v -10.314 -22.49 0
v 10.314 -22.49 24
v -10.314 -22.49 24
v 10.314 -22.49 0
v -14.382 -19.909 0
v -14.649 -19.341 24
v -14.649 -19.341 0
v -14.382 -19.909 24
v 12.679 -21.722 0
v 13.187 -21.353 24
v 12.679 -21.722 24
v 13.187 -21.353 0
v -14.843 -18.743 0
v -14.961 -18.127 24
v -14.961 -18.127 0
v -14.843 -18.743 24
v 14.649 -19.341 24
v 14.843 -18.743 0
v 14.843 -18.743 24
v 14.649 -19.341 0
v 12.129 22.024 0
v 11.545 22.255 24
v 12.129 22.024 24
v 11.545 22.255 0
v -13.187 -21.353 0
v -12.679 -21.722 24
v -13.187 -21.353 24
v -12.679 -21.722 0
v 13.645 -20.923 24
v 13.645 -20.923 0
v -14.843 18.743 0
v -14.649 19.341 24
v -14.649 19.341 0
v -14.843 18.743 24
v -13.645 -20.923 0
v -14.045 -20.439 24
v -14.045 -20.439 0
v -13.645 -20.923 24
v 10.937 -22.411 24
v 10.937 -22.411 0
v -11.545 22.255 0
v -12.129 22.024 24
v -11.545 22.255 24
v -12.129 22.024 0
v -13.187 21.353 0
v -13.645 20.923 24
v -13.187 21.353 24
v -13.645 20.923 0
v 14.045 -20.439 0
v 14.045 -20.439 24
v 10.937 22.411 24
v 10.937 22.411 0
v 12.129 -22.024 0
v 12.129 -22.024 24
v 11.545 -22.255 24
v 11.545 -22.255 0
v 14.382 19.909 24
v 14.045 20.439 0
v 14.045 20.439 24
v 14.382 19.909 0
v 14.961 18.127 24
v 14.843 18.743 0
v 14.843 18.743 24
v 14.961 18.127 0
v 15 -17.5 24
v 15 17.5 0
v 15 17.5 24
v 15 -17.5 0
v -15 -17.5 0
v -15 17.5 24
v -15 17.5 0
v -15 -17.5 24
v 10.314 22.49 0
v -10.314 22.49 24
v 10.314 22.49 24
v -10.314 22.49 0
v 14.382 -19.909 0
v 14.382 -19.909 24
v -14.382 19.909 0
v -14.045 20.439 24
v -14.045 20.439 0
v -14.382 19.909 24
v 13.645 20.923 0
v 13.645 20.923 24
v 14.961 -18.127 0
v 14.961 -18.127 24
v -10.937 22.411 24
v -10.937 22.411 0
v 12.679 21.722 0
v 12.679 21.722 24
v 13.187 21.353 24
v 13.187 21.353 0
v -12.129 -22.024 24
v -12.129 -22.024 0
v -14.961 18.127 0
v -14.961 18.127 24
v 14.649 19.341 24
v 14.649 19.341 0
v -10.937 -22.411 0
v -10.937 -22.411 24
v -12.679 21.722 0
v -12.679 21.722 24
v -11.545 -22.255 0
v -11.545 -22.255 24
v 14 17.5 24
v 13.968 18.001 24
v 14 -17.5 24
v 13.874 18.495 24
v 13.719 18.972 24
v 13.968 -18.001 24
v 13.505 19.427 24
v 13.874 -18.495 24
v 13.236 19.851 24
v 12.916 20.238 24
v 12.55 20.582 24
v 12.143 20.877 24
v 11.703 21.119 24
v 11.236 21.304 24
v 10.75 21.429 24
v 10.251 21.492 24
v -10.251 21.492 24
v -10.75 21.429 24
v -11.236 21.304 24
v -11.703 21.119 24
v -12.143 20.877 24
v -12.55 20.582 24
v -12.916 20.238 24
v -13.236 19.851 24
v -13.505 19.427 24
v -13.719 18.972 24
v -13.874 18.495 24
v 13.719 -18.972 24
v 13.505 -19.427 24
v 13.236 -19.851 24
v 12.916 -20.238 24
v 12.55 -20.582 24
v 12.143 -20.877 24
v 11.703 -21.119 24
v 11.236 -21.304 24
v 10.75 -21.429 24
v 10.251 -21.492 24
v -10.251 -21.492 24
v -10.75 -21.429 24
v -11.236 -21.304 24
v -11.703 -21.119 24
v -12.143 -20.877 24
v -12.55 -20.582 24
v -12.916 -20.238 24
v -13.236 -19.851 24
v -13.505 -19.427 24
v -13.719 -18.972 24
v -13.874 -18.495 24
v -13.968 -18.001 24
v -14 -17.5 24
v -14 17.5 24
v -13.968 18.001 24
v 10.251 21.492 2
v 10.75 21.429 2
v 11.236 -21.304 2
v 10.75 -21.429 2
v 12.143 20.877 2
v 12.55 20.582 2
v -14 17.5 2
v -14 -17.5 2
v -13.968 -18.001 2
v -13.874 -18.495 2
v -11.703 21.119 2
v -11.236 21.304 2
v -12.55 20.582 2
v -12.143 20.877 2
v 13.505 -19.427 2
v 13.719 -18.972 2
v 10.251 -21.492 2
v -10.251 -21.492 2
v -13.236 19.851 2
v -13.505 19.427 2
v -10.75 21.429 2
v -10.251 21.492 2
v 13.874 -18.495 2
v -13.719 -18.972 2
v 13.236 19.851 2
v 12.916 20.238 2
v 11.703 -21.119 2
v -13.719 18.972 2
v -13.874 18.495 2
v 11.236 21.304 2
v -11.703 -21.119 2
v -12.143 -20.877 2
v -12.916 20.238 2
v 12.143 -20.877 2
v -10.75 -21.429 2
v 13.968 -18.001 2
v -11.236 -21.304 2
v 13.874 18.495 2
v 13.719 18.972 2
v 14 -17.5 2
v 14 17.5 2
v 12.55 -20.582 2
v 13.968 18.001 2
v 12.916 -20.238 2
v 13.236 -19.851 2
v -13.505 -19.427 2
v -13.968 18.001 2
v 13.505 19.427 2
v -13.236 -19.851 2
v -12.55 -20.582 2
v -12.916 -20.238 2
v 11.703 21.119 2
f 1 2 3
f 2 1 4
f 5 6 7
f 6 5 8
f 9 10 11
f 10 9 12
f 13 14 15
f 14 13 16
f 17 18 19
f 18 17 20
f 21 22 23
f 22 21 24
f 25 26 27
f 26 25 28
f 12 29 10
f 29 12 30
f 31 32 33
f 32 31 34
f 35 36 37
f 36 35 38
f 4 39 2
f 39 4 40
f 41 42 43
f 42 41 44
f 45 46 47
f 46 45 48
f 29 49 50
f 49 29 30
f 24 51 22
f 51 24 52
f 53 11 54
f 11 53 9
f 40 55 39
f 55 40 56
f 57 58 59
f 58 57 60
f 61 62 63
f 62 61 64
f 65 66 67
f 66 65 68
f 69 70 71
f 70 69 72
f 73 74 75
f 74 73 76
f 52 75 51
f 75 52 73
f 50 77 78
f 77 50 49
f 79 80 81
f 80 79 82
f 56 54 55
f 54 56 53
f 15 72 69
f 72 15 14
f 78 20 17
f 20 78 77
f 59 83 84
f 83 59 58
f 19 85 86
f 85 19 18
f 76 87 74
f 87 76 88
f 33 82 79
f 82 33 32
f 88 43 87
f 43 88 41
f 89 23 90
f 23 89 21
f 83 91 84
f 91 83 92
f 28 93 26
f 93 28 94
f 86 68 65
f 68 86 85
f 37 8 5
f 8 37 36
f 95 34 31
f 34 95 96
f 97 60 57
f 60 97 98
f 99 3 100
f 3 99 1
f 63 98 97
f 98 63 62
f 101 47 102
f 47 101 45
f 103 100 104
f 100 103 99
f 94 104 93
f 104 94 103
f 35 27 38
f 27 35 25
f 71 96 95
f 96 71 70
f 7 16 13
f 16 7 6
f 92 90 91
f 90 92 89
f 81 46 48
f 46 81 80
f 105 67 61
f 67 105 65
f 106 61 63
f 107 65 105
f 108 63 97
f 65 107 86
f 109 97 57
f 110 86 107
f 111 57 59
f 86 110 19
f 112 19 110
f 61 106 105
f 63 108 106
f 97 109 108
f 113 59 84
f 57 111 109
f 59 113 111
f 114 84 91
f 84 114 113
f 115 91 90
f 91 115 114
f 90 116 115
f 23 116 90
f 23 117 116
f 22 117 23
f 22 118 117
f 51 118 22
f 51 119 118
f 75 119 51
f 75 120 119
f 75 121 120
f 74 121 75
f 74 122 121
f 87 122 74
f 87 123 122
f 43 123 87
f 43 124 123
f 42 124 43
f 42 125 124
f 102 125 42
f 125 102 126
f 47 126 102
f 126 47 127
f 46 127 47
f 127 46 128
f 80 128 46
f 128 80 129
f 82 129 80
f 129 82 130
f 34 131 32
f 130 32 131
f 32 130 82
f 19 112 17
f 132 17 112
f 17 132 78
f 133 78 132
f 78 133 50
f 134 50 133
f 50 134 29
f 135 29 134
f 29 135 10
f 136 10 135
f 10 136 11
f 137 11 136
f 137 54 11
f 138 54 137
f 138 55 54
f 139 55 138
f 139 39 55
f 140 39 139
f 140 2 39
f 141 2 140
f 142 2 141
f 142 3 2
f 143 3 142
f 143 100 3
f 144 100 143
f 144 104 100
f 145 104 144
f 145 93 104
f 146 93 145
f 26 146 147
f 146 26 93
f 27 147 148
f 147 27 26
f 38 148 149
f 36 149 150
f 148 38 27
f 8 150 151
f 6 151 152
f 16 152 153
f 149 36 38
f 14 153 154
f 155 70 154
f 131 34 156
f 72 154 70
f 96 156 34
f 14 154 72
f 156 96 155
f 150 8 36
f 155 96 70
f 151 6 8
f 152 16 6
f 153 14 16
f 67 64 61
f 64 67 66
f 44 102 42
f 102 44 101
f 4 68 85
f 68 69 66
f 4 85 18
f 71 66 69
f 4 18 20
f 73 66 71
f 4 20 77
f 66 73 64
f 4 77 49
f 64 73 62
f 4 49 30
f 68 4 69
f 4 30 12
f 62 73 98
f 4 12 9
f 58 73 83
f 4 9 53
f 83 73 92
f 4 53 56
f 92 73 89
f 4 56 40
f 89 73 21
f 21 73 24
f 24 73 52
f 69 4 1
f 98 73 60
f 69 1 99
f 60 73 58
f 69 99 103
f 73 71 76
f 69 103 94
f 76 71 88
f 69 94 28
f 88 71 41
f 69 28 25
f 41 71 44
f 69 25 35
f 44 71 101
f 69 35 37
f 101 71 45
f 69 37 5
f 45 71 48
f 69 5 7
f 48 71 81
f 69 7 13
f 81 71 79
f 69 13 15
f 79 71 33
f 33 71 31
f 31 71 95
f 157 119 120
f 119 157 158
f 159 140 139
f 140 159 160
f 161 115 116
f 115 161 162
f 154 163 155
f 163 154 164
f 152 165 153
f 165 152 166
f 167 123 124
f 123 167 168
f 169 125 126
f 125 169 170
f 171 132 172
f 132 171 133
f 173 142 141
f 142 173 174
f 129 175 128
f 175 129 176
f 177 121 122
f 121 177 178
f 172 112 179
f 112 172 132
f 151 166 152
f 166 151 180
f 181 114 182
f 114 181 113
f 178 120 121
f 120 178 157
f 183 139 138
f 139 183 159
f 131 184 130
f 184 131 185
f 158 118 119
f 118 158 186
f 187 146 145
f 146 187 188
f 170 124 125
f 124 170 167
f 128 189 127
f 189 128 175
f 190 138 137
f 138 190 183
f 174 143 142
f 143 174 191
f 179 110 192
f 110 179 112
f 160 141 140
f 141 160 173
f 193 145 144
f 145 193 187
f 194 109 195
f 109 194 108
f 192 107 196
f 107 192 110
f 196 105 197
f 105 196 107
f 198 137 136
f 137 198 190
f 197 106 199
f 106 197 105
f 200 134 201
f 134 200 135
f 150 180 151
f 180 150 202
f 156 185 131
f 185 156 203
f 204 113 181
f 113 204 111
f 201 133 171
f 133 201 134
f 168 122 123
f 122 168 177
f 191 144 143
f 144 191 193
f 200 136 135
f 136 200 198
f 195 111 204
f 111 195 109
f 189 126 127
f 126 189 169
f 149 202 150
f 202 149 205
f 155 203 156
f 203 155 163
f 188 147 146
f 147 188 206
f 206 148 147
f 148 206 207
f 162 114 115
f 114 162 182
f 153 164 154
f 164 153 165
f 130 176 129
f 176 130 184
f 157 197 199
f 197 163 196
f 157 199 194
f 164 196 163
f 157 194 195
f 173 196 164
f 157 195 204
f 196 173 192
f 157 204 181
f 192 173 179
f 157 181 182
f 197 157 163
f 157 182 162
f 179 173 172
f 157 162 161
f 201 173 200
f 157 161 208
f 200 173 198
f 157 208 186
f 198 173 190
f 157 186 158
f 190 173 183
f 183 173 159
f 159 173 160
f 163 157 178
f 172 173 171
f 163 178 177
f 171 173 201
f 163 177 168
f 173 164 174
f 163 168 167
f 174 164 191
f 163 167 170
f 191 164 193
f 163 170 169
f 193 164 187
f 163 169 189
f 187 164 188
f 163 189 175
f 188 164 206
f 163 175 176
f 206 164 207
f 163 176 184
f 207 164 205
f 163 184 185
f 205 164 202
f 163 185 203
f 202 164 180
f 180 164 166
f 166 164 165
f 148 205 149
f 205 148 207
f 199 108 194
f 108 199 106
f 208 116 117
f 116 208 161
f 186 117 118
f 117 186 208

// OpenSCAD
$fn = 50;


difference() {
	union() {
		hull() {
			translate(v = [-10.0000000000, 17.5000000000, 0]) {
				cylinder(h = 24, r = 5);
			}
			translate(v = [10.0000000000, 17.5000000000, 0]) {
				cylinder(h = 24, r = 5);
			}
			translate(v = [-10.0000000000, -17.5000000000, 0]) {
				cylinder(h = 24, r = 5);
			}
			translate(v = [10.0000000000, -17.5000000000, 0]) {
				cylinder(h = 24, r = 5);
			}
		}
	}
	union() {
		translate(v = [0, 0, 2]) {
			hull() {
				translate(v = [-10.0000000000, 17.5000000000, 0]) {
					cylinder(h = 22, r = 4);
				}
				translate(v = [10.0000000000, 17.5000000000, 0]) {
					cylinder(h = 22, r = 4);
				}
				translate(v = [-10.0000000000, -17.5000000000, 0]) {
					cylinder(h = 22, r = 4);
				}
				translate(v = [10.0000000000, -17.5000000000, 0]) {
					cylinder(h = 22, r = 4);
				}
			}
		}
	}
}
